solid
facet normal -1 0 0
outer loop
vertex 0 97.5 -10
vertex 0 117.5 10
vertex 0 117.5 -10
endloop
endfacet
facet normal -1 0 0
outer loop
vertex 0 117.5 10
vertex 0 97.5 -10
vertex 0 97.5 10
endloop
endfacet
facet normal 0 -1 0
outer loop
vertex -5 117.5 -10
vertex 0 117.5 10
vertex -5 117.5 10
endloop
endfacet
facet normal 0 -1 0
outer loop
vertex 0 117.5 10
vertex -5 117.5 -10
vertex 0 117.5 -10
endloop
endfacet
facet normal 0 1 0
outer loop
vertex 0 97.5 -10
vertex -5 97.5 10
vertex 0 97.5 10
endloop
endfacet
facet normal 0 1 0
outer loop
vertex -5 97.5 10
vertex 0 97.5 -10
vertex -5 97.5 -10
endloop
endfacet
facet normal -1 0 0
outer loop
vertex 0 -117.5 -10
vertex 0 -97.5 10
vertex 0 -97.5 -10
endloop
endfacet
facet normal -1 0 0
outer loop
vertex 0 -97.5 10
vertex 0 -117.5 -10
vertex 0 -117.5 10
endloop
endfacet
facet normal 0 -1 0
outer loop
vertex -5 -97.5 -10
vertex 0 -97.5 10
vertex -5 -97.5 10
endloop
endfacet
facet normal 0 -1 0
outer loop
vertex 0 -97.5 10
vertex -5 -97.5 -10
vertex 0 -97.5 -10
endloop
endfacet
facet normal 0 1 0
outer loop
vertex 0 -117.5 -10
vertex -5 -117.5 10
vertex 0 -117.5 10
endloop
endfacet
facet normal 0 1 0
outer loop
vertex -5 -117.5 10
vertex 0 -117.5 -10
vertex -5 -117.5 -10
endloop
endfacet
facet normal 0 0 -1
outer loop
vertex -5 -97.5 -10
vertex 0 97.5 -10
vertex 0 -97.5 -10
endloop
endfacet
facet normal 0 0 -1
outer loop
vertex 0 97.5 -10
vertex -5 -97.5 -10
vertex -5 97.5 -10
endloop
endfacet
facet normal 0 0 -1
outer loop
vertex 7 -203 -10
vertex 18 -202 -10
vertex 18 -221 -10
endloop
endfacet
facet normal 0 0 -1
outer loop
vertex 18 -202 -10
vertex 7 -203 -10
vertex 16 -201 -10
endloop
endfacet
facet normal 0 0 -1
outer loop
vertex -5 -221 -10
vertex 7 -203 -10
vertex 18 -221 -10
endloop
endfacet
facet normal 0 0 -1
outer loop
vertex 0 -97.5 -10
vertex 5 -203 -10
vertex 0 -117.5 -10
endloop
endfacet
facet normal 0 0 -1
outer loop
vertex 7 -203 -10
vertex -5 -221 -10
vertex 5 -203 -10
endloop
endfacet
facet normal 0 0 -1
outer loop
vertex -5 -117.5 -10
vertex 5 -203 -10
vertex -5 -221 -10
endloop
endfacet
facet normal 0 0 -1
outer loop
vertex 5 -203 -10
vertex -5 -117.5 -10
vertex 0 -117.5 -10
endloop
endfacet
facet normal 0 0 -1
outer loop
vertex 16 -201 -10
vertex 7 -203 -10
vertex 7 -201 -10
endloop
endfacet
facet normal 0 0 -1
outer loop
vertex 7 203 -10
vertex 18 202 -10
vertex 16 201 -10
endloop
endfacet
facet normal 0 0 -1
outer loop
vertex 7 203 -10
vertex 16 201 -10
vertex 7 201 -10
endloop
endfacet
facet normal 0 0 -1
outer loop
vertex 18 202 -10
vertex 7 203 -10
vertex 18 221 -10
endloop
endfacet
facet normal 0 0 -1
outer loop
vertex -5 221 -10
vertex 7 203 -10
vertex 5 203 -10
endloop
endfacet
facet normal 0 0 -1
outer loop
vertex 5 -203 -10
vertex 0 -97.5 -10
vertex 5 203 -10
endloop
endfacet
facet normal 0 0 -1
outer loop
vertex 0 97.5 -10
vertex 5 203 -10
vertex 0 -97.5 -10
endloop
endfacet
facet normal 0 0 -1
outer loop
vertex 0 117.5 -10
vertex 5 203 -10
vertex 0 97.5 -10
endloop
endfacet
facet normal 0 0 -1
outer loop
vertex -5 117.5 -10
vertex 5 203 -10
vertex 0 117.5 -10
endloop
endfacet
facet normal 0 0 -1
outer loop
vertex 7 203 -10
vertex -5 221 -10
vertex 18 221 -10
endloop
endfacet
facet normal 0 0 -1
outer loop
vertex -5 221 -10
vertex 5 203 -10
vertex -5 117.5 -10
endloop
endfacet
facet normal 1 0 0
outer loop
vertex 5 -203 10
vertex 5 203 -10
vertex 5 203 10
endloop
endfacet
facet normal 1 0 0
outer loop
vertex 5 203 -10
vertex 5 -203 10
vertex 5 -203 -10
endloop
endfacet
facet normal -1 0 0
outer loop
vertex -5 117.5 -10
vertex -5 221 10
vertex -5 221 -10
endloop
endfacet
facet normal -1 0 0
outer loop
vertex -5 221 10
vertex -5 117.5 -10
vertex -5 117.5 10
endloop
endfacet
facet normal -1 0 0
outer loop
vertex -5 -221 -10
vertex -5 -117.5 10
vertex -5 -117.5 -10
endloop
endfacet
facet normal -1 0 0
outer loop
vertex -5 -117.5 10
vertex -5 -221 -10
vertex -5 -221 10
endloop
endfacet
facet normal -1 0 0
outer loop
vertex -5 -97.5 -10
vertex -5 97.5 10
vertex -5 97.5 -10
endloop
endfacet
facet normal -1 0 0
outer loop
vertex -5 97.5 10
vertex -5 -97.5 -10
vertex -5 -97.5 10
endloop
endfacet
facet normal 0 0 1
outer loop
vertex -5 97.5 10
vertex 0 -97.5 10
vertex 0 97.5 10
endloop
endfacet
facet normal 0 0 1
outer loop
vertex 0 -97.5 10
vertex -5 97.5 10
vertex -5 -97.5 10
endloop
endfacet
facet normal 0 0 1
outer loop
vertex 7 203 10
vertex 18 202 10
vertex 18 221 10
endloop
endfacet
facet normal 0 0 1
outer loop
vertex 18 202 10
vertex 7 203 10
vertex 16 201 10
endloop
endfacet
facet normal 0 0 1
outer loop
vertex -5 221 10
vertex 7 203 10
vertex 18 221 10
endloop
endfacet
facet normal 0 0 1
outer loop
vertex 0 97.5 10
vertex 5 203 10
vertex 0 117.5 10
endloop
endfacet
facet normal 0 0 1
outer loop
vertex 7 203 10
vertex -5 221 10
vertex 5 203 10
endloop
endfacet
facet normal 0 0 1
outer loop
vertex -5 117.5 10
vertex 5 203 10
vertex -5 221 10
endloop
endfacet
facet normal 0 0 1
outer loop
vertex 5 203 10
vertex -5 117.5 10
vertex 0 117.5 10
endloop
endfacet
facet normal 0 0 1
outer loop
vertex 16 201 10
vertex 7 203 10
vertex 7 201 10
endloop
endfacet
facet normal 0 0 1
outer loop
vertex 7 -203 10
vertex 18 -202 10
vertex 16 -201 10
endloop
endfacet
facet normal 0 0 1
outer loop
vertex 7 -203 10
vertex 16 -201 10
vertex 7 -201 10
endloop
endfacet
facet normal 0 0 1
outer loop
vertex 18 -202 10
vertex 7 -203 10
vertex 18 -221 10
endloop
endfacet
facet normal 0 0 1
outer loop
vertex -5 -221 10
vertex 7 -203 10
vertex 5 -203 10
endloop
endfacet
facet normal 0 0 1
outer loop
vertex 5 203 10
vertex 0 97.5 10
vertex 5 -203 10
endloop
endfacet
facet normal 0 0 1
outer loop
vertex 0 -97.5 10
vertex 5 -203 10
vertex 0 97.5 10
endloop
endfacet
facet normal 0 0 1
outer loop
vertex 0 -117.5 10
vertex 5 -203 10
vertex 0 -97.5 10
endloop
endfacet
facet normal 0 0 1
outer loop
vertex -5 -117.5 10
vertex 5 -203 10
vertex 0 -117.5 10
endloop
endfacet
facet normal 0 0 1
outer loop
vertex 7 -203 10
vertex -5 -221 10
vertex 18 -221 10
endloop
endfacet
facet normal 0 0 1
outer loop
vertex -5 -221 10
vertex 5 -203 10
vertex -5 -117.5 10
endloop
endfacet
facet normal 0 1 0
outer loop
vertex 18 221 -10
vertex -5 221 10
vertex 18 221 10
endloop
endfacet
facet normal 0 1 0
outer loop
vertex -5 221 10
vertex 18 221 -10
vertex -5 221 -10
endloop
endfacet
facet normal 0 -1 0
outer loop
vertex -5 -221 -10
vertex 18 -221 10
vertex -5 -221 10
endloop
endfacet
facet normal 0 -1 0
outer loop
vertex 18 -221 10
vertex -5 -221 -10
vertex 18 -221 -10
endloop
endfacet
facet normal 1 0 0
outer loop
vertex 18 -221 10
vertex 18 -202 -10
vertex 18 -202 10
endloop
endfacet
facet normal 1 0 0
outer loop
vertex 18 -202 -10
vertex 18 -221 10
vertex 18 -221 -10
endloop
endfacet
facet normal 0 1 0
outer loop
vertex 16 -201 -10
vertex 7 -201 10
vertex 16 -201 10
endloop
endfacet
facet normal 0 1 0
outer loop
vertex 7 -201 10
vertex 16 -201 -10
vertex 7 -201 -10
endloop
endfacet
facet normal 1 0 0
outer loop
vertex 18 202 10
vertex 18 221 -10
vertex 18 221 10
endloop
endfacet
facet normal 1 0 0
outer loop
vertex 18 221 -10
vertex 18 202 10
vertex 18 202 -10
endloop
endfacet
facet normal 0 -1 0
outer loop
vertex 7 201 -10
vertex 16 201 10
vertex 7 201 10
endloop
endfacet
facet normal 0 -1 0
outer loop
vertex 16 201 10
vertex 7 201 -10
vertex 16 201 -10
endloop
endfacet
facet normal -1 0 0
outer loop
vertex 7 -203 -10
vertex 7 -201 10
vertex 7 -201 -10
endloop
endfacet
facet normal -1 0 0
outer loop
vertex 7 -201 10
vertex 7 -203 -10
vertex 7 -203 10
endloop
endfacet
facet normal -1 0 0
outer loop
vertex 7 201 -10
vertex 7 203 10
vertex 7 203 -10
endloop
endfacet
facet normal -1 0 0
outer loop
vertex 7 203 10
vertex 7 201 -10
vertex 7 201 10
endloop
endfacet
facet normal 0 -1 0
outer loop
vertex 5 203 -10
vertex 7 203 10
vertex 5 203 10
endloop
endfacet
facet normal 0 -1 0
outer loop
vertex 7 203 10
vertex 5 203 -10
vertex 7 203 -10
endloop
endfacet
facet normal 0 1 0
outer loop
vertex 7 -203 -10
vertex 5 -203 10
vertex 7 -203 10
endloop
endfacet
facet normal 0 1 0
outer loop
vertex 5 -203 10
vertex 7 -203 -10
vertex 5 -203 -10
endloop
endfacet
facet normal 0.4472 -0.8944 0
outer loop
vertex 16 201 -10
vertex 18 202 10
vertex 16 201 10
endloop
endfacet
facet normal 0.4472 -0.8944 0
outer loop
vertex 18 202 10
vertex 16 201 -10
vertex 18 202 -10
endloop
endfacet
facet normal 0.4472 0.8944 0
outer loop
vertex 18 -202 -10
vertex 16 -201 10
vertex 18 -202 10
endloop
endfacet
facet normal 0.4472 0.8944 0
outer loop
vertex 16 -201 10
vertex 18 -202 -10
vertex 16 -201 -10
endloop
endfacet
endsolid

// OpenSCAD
depth = 402;
width = 402;

thickness = 20;
height = 10;

total_bed_height = 11;
constrained_bed_height = 9;

center_square_size = 175;

heater_pad_gap = 2;

ease_in_width = 1;
ease_in_height = 2;

module bar(bar_length, interface_side, crossing_offsets)
{
  union()
  {
    difference()
    {
      cube([thickness, bar_length + 2 * thickness, height], center = true);
      
      for (crossing_offset = crossing_offsets)
      {
        translation = 
          + (crossing_offset == 0
             ? 0
             : sign(crossing_offset) * 0.5 * (center_square_size + thickness) + crossing_offset);
        
        translate([0, translation, height * 0.5 * interface_side])
        cube([2 * thickness, thickness, height], center = true);
      }
    }
    
    difference()
    {
      union()
      {
        translate([0, -bar_length * 0.5 - thickness * 0.5, 0.5 * total_bed_height + 0.5 * ease_in_height])
        cube([thickness, thickness, height + total_bed_height + ease_in_height], center = true);

        translate([0, bar_length * 0.5 + thickness * 0.5, 0.5 * total_bed_height + 0.5 * ease_in_height])
        cube([thickness, thickness, height + total_bed_height + ease_in_height], center = true);
      }
      
      translate([0, 0, 0.5 * height + 0.5 * (total_bed_height - constrained_bed_height)])
      cube([2 * thickness, bar_length + 2 * heater_pad_gap, total_bed_height - constrained_bed_height], center = true);
     
      translate([0, 0, 0.5 * height + total_bed_height])
      multmatrix(
        [[1, 0, 0, -thickness],
         [0, 1, ease_in_width / ease_in_height, -0.5 * bar_length],
         [0, 0, 1, 0],
         [0, 0, 0, 1]])
      {
        cube([2 * thickness, bar_length, ease_in_height]);
      }

      translate([0, 0, 0.5 * height + total_bed_height])
      multmatrix(
        [[1, 0, 0, -thickness],
         [0, 1, -ease_in_width / ease_in_height, -0.5 * bar_length],
         [0, 0, 1, 0],
         [0, 0, 0, 1]])
      {
        cube([2 * thickness, bar_length, ease_in_height]);
      }
    }
  }
}

rotate([0, 90, 0])
//bar(depth, 1, [30, -30, 0]);
bar(width, -1, [10, -10]);
